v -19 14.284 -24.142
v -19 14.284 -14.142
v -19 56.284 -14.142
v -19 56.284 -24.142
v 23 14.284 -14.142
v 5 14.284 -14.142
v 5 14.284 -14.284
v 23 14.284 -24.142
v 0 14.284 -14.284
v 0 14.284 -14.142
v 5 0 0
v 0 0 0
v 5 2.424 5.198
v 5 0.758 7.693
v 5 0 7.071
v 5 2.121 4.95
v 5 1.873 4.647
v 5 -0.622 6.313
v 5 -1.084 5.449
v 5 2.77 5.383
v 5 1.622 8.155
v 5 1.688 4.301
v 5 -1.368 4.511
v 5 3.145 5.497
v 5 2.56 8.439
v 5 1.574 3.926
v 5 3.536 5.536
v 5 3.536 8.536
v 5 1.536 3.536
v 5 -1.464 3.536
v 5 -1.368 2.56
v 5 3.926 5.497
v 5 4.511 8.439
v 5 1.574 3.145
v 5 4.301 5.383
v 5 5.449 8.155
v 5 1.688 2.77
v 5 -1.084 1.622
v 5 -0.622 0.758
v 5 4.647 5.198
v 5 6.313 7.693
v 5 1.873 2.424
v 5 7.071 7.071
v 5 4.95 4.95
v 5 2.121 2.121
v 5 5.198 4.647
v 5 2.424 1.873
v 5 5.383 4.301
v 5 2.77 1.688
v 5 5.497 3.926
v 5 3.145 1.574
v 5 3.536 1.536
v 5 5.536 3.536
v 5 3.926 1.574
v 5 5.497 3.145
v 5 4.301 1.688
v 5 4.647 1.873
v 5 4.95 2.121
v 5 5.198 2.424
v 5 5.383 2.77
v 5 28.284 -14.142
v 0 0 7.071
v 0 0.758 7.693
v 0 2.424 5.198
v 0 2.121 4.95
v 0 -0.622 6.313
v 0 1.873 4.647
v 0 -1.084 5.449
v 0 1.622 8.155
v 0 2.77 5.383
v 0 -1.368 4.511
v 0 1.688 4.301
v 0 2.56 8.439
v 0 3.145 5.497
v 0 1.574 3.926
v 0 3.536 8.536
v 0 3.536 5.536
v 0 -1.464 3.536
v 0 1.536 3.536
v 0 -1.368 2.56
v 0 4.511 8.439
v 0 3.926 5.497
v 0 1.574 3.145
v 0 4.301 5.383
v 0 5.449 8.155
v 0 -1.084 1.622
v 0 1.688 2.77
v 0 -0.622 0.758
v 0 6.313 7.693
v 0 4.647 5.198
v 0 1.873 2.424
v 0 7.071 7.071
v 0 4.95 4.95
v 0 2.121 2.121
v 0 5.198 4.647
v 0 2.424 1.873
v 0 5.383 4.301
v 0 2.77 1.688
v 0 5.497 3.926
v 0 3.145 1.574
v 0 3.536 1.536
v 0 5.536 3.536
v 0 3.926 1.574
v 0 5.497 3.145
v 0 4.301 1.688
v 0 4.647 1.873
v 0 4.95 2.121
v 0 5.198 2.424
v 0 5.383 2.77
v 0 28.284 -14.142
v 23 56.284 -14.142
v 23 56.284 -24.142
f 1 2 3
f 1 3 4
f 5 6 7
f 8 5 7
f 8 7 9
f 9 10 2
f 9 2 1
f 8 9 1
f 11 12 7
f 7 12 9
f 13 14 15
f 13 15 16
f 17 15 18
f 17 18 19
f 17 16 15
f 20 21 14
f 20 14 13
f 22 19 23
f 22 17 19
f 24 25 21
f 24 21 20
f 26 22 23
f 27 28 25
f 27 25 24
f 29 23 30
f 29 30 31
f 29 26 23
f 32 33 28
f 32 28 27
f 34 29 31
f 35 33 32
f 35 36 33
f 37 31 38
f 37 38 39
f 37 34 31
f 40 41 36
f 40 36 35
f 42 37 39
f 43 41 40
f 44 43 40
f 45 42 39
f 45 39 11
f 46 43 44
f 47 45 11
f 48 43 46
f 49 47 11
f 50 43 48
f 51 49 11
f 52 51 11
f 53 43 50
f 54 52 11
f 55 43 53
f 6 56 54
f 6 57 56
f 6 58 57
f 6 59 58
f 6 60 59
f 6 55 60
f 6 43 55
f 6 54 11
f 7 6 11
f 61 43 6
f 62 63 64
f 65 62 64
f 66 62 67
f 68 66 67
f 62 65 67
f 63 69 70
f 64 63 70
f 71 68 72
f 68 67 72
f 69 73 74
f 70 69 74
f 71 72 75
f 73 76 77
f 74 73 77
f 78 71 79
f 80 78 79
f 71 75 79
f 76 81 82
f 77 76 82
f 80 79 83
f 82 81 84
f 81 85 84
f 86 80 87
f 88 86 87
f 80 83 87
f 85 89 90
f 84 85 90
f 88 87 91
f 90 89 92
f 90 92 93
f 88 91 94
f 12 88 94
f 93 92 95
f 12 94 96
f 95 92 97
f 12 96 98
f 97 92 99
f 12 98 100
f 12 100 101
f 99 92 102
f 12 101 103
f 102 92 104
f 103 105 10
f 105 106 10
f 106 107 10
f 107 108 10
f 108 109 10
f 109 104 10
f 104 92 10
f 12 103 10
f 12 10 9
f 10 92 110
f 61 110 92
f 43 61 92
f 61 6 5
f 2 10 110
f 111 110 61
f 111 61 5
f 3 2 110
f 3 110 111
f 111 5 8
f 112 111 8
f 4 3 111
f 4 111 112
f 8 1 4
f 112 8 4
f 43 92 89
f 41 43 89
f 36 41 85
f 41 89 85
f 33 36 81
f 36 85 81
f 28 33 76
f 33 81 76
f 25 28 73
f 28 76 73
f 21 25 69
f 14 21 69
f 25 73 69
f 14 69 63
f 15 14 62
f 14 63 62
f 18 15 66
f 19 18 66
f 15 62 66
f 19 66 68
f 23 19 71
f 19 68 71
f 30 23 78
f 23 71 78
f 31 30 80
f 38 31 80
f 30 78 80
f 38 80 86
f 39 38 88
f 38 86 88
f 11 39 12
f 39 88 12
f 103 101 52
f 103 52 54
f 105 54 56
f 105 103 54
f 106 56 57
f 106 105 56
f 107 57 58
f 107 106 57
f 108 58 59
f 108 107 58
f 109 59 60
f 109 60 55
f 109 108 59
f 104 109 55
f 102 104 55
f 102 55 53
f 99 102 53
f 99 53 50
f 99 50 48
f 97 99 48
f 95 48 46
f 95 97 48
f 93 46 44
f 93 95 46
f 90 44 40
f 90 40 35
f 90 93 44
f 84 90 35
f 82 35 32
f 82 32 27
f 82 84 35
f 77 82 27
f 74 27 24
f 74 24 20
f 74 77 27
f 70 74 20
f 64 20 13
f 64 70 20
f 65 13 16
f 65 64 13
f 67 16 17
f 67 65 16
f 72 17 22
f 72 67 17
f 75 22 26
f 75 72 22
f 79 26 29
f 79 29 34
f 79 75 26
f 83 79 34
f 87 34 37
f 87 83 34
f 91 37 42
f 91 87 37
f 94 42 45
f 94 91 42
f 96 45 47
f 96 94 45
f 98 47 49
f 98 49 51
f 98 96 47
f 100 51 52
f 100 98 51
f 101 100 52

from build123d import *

# Parameters (mm, degrees)
CROQUIS1_R                    = 2
SALIENTE_EXTRUIR9_DEPTH       = 5
SALIENTE_EXTRUIR10_DEPTH      = 18
SALIENTE_EXTRUIR10_DEPTH_BACK = 24
CROQUIS7_W                    = 10
CROQUIS7_H                    = 42


with BuildPart() as part:
    # Croquis1 → Saliente-Extruir9 (new body)
    with BuildSketch(Plane(origin=(0, 0, 0), x_dir=(0, 0, -1), z_dir=(1, 0, 0))):
        with BuildLine():
            Line((0, 0), (21.213203436, 21.213203436))
            Line((21.213203436, 21.213203436), (14.142135624, 28.284271247))
            Line((14.142135624, 28.284271247), (-7.071067812, 7.071067812))
            ThreePointArc((-7.071067812, 7.071067812), (-7.071067812, 0), (0, 0))
        make_face()
        with Locations((-3.535533906, 3.535533906)):
            Circle(CROQUIS1_R, mode=Mode.SUBTRACT)
    extrude(amount=SALIENTE_EXTRUIR9_DEPTH)

    # Croquis7 → Saliente-Extruir10 (add, two sides: drawn at the far end of the back side and taken through both)
    with BuildSketch(Plane(origin=(5, 0, 0), x_dir=(0, 0, -1), z_dir=(1, 0, 0)).offset(-SALIENTE_EXTRUIR10_DEPTH_BACK)):
        with Locations((19.142135624, 35.284271247)):
            Rectangle(CROQUIS7_W, CROQUIS7_H)
    extrude(amount=SALIENTE_EXTRUIR10_DEPTH + SALIENTE_EXTRUIR10_DEPTH_BACK)


solid = part.part
